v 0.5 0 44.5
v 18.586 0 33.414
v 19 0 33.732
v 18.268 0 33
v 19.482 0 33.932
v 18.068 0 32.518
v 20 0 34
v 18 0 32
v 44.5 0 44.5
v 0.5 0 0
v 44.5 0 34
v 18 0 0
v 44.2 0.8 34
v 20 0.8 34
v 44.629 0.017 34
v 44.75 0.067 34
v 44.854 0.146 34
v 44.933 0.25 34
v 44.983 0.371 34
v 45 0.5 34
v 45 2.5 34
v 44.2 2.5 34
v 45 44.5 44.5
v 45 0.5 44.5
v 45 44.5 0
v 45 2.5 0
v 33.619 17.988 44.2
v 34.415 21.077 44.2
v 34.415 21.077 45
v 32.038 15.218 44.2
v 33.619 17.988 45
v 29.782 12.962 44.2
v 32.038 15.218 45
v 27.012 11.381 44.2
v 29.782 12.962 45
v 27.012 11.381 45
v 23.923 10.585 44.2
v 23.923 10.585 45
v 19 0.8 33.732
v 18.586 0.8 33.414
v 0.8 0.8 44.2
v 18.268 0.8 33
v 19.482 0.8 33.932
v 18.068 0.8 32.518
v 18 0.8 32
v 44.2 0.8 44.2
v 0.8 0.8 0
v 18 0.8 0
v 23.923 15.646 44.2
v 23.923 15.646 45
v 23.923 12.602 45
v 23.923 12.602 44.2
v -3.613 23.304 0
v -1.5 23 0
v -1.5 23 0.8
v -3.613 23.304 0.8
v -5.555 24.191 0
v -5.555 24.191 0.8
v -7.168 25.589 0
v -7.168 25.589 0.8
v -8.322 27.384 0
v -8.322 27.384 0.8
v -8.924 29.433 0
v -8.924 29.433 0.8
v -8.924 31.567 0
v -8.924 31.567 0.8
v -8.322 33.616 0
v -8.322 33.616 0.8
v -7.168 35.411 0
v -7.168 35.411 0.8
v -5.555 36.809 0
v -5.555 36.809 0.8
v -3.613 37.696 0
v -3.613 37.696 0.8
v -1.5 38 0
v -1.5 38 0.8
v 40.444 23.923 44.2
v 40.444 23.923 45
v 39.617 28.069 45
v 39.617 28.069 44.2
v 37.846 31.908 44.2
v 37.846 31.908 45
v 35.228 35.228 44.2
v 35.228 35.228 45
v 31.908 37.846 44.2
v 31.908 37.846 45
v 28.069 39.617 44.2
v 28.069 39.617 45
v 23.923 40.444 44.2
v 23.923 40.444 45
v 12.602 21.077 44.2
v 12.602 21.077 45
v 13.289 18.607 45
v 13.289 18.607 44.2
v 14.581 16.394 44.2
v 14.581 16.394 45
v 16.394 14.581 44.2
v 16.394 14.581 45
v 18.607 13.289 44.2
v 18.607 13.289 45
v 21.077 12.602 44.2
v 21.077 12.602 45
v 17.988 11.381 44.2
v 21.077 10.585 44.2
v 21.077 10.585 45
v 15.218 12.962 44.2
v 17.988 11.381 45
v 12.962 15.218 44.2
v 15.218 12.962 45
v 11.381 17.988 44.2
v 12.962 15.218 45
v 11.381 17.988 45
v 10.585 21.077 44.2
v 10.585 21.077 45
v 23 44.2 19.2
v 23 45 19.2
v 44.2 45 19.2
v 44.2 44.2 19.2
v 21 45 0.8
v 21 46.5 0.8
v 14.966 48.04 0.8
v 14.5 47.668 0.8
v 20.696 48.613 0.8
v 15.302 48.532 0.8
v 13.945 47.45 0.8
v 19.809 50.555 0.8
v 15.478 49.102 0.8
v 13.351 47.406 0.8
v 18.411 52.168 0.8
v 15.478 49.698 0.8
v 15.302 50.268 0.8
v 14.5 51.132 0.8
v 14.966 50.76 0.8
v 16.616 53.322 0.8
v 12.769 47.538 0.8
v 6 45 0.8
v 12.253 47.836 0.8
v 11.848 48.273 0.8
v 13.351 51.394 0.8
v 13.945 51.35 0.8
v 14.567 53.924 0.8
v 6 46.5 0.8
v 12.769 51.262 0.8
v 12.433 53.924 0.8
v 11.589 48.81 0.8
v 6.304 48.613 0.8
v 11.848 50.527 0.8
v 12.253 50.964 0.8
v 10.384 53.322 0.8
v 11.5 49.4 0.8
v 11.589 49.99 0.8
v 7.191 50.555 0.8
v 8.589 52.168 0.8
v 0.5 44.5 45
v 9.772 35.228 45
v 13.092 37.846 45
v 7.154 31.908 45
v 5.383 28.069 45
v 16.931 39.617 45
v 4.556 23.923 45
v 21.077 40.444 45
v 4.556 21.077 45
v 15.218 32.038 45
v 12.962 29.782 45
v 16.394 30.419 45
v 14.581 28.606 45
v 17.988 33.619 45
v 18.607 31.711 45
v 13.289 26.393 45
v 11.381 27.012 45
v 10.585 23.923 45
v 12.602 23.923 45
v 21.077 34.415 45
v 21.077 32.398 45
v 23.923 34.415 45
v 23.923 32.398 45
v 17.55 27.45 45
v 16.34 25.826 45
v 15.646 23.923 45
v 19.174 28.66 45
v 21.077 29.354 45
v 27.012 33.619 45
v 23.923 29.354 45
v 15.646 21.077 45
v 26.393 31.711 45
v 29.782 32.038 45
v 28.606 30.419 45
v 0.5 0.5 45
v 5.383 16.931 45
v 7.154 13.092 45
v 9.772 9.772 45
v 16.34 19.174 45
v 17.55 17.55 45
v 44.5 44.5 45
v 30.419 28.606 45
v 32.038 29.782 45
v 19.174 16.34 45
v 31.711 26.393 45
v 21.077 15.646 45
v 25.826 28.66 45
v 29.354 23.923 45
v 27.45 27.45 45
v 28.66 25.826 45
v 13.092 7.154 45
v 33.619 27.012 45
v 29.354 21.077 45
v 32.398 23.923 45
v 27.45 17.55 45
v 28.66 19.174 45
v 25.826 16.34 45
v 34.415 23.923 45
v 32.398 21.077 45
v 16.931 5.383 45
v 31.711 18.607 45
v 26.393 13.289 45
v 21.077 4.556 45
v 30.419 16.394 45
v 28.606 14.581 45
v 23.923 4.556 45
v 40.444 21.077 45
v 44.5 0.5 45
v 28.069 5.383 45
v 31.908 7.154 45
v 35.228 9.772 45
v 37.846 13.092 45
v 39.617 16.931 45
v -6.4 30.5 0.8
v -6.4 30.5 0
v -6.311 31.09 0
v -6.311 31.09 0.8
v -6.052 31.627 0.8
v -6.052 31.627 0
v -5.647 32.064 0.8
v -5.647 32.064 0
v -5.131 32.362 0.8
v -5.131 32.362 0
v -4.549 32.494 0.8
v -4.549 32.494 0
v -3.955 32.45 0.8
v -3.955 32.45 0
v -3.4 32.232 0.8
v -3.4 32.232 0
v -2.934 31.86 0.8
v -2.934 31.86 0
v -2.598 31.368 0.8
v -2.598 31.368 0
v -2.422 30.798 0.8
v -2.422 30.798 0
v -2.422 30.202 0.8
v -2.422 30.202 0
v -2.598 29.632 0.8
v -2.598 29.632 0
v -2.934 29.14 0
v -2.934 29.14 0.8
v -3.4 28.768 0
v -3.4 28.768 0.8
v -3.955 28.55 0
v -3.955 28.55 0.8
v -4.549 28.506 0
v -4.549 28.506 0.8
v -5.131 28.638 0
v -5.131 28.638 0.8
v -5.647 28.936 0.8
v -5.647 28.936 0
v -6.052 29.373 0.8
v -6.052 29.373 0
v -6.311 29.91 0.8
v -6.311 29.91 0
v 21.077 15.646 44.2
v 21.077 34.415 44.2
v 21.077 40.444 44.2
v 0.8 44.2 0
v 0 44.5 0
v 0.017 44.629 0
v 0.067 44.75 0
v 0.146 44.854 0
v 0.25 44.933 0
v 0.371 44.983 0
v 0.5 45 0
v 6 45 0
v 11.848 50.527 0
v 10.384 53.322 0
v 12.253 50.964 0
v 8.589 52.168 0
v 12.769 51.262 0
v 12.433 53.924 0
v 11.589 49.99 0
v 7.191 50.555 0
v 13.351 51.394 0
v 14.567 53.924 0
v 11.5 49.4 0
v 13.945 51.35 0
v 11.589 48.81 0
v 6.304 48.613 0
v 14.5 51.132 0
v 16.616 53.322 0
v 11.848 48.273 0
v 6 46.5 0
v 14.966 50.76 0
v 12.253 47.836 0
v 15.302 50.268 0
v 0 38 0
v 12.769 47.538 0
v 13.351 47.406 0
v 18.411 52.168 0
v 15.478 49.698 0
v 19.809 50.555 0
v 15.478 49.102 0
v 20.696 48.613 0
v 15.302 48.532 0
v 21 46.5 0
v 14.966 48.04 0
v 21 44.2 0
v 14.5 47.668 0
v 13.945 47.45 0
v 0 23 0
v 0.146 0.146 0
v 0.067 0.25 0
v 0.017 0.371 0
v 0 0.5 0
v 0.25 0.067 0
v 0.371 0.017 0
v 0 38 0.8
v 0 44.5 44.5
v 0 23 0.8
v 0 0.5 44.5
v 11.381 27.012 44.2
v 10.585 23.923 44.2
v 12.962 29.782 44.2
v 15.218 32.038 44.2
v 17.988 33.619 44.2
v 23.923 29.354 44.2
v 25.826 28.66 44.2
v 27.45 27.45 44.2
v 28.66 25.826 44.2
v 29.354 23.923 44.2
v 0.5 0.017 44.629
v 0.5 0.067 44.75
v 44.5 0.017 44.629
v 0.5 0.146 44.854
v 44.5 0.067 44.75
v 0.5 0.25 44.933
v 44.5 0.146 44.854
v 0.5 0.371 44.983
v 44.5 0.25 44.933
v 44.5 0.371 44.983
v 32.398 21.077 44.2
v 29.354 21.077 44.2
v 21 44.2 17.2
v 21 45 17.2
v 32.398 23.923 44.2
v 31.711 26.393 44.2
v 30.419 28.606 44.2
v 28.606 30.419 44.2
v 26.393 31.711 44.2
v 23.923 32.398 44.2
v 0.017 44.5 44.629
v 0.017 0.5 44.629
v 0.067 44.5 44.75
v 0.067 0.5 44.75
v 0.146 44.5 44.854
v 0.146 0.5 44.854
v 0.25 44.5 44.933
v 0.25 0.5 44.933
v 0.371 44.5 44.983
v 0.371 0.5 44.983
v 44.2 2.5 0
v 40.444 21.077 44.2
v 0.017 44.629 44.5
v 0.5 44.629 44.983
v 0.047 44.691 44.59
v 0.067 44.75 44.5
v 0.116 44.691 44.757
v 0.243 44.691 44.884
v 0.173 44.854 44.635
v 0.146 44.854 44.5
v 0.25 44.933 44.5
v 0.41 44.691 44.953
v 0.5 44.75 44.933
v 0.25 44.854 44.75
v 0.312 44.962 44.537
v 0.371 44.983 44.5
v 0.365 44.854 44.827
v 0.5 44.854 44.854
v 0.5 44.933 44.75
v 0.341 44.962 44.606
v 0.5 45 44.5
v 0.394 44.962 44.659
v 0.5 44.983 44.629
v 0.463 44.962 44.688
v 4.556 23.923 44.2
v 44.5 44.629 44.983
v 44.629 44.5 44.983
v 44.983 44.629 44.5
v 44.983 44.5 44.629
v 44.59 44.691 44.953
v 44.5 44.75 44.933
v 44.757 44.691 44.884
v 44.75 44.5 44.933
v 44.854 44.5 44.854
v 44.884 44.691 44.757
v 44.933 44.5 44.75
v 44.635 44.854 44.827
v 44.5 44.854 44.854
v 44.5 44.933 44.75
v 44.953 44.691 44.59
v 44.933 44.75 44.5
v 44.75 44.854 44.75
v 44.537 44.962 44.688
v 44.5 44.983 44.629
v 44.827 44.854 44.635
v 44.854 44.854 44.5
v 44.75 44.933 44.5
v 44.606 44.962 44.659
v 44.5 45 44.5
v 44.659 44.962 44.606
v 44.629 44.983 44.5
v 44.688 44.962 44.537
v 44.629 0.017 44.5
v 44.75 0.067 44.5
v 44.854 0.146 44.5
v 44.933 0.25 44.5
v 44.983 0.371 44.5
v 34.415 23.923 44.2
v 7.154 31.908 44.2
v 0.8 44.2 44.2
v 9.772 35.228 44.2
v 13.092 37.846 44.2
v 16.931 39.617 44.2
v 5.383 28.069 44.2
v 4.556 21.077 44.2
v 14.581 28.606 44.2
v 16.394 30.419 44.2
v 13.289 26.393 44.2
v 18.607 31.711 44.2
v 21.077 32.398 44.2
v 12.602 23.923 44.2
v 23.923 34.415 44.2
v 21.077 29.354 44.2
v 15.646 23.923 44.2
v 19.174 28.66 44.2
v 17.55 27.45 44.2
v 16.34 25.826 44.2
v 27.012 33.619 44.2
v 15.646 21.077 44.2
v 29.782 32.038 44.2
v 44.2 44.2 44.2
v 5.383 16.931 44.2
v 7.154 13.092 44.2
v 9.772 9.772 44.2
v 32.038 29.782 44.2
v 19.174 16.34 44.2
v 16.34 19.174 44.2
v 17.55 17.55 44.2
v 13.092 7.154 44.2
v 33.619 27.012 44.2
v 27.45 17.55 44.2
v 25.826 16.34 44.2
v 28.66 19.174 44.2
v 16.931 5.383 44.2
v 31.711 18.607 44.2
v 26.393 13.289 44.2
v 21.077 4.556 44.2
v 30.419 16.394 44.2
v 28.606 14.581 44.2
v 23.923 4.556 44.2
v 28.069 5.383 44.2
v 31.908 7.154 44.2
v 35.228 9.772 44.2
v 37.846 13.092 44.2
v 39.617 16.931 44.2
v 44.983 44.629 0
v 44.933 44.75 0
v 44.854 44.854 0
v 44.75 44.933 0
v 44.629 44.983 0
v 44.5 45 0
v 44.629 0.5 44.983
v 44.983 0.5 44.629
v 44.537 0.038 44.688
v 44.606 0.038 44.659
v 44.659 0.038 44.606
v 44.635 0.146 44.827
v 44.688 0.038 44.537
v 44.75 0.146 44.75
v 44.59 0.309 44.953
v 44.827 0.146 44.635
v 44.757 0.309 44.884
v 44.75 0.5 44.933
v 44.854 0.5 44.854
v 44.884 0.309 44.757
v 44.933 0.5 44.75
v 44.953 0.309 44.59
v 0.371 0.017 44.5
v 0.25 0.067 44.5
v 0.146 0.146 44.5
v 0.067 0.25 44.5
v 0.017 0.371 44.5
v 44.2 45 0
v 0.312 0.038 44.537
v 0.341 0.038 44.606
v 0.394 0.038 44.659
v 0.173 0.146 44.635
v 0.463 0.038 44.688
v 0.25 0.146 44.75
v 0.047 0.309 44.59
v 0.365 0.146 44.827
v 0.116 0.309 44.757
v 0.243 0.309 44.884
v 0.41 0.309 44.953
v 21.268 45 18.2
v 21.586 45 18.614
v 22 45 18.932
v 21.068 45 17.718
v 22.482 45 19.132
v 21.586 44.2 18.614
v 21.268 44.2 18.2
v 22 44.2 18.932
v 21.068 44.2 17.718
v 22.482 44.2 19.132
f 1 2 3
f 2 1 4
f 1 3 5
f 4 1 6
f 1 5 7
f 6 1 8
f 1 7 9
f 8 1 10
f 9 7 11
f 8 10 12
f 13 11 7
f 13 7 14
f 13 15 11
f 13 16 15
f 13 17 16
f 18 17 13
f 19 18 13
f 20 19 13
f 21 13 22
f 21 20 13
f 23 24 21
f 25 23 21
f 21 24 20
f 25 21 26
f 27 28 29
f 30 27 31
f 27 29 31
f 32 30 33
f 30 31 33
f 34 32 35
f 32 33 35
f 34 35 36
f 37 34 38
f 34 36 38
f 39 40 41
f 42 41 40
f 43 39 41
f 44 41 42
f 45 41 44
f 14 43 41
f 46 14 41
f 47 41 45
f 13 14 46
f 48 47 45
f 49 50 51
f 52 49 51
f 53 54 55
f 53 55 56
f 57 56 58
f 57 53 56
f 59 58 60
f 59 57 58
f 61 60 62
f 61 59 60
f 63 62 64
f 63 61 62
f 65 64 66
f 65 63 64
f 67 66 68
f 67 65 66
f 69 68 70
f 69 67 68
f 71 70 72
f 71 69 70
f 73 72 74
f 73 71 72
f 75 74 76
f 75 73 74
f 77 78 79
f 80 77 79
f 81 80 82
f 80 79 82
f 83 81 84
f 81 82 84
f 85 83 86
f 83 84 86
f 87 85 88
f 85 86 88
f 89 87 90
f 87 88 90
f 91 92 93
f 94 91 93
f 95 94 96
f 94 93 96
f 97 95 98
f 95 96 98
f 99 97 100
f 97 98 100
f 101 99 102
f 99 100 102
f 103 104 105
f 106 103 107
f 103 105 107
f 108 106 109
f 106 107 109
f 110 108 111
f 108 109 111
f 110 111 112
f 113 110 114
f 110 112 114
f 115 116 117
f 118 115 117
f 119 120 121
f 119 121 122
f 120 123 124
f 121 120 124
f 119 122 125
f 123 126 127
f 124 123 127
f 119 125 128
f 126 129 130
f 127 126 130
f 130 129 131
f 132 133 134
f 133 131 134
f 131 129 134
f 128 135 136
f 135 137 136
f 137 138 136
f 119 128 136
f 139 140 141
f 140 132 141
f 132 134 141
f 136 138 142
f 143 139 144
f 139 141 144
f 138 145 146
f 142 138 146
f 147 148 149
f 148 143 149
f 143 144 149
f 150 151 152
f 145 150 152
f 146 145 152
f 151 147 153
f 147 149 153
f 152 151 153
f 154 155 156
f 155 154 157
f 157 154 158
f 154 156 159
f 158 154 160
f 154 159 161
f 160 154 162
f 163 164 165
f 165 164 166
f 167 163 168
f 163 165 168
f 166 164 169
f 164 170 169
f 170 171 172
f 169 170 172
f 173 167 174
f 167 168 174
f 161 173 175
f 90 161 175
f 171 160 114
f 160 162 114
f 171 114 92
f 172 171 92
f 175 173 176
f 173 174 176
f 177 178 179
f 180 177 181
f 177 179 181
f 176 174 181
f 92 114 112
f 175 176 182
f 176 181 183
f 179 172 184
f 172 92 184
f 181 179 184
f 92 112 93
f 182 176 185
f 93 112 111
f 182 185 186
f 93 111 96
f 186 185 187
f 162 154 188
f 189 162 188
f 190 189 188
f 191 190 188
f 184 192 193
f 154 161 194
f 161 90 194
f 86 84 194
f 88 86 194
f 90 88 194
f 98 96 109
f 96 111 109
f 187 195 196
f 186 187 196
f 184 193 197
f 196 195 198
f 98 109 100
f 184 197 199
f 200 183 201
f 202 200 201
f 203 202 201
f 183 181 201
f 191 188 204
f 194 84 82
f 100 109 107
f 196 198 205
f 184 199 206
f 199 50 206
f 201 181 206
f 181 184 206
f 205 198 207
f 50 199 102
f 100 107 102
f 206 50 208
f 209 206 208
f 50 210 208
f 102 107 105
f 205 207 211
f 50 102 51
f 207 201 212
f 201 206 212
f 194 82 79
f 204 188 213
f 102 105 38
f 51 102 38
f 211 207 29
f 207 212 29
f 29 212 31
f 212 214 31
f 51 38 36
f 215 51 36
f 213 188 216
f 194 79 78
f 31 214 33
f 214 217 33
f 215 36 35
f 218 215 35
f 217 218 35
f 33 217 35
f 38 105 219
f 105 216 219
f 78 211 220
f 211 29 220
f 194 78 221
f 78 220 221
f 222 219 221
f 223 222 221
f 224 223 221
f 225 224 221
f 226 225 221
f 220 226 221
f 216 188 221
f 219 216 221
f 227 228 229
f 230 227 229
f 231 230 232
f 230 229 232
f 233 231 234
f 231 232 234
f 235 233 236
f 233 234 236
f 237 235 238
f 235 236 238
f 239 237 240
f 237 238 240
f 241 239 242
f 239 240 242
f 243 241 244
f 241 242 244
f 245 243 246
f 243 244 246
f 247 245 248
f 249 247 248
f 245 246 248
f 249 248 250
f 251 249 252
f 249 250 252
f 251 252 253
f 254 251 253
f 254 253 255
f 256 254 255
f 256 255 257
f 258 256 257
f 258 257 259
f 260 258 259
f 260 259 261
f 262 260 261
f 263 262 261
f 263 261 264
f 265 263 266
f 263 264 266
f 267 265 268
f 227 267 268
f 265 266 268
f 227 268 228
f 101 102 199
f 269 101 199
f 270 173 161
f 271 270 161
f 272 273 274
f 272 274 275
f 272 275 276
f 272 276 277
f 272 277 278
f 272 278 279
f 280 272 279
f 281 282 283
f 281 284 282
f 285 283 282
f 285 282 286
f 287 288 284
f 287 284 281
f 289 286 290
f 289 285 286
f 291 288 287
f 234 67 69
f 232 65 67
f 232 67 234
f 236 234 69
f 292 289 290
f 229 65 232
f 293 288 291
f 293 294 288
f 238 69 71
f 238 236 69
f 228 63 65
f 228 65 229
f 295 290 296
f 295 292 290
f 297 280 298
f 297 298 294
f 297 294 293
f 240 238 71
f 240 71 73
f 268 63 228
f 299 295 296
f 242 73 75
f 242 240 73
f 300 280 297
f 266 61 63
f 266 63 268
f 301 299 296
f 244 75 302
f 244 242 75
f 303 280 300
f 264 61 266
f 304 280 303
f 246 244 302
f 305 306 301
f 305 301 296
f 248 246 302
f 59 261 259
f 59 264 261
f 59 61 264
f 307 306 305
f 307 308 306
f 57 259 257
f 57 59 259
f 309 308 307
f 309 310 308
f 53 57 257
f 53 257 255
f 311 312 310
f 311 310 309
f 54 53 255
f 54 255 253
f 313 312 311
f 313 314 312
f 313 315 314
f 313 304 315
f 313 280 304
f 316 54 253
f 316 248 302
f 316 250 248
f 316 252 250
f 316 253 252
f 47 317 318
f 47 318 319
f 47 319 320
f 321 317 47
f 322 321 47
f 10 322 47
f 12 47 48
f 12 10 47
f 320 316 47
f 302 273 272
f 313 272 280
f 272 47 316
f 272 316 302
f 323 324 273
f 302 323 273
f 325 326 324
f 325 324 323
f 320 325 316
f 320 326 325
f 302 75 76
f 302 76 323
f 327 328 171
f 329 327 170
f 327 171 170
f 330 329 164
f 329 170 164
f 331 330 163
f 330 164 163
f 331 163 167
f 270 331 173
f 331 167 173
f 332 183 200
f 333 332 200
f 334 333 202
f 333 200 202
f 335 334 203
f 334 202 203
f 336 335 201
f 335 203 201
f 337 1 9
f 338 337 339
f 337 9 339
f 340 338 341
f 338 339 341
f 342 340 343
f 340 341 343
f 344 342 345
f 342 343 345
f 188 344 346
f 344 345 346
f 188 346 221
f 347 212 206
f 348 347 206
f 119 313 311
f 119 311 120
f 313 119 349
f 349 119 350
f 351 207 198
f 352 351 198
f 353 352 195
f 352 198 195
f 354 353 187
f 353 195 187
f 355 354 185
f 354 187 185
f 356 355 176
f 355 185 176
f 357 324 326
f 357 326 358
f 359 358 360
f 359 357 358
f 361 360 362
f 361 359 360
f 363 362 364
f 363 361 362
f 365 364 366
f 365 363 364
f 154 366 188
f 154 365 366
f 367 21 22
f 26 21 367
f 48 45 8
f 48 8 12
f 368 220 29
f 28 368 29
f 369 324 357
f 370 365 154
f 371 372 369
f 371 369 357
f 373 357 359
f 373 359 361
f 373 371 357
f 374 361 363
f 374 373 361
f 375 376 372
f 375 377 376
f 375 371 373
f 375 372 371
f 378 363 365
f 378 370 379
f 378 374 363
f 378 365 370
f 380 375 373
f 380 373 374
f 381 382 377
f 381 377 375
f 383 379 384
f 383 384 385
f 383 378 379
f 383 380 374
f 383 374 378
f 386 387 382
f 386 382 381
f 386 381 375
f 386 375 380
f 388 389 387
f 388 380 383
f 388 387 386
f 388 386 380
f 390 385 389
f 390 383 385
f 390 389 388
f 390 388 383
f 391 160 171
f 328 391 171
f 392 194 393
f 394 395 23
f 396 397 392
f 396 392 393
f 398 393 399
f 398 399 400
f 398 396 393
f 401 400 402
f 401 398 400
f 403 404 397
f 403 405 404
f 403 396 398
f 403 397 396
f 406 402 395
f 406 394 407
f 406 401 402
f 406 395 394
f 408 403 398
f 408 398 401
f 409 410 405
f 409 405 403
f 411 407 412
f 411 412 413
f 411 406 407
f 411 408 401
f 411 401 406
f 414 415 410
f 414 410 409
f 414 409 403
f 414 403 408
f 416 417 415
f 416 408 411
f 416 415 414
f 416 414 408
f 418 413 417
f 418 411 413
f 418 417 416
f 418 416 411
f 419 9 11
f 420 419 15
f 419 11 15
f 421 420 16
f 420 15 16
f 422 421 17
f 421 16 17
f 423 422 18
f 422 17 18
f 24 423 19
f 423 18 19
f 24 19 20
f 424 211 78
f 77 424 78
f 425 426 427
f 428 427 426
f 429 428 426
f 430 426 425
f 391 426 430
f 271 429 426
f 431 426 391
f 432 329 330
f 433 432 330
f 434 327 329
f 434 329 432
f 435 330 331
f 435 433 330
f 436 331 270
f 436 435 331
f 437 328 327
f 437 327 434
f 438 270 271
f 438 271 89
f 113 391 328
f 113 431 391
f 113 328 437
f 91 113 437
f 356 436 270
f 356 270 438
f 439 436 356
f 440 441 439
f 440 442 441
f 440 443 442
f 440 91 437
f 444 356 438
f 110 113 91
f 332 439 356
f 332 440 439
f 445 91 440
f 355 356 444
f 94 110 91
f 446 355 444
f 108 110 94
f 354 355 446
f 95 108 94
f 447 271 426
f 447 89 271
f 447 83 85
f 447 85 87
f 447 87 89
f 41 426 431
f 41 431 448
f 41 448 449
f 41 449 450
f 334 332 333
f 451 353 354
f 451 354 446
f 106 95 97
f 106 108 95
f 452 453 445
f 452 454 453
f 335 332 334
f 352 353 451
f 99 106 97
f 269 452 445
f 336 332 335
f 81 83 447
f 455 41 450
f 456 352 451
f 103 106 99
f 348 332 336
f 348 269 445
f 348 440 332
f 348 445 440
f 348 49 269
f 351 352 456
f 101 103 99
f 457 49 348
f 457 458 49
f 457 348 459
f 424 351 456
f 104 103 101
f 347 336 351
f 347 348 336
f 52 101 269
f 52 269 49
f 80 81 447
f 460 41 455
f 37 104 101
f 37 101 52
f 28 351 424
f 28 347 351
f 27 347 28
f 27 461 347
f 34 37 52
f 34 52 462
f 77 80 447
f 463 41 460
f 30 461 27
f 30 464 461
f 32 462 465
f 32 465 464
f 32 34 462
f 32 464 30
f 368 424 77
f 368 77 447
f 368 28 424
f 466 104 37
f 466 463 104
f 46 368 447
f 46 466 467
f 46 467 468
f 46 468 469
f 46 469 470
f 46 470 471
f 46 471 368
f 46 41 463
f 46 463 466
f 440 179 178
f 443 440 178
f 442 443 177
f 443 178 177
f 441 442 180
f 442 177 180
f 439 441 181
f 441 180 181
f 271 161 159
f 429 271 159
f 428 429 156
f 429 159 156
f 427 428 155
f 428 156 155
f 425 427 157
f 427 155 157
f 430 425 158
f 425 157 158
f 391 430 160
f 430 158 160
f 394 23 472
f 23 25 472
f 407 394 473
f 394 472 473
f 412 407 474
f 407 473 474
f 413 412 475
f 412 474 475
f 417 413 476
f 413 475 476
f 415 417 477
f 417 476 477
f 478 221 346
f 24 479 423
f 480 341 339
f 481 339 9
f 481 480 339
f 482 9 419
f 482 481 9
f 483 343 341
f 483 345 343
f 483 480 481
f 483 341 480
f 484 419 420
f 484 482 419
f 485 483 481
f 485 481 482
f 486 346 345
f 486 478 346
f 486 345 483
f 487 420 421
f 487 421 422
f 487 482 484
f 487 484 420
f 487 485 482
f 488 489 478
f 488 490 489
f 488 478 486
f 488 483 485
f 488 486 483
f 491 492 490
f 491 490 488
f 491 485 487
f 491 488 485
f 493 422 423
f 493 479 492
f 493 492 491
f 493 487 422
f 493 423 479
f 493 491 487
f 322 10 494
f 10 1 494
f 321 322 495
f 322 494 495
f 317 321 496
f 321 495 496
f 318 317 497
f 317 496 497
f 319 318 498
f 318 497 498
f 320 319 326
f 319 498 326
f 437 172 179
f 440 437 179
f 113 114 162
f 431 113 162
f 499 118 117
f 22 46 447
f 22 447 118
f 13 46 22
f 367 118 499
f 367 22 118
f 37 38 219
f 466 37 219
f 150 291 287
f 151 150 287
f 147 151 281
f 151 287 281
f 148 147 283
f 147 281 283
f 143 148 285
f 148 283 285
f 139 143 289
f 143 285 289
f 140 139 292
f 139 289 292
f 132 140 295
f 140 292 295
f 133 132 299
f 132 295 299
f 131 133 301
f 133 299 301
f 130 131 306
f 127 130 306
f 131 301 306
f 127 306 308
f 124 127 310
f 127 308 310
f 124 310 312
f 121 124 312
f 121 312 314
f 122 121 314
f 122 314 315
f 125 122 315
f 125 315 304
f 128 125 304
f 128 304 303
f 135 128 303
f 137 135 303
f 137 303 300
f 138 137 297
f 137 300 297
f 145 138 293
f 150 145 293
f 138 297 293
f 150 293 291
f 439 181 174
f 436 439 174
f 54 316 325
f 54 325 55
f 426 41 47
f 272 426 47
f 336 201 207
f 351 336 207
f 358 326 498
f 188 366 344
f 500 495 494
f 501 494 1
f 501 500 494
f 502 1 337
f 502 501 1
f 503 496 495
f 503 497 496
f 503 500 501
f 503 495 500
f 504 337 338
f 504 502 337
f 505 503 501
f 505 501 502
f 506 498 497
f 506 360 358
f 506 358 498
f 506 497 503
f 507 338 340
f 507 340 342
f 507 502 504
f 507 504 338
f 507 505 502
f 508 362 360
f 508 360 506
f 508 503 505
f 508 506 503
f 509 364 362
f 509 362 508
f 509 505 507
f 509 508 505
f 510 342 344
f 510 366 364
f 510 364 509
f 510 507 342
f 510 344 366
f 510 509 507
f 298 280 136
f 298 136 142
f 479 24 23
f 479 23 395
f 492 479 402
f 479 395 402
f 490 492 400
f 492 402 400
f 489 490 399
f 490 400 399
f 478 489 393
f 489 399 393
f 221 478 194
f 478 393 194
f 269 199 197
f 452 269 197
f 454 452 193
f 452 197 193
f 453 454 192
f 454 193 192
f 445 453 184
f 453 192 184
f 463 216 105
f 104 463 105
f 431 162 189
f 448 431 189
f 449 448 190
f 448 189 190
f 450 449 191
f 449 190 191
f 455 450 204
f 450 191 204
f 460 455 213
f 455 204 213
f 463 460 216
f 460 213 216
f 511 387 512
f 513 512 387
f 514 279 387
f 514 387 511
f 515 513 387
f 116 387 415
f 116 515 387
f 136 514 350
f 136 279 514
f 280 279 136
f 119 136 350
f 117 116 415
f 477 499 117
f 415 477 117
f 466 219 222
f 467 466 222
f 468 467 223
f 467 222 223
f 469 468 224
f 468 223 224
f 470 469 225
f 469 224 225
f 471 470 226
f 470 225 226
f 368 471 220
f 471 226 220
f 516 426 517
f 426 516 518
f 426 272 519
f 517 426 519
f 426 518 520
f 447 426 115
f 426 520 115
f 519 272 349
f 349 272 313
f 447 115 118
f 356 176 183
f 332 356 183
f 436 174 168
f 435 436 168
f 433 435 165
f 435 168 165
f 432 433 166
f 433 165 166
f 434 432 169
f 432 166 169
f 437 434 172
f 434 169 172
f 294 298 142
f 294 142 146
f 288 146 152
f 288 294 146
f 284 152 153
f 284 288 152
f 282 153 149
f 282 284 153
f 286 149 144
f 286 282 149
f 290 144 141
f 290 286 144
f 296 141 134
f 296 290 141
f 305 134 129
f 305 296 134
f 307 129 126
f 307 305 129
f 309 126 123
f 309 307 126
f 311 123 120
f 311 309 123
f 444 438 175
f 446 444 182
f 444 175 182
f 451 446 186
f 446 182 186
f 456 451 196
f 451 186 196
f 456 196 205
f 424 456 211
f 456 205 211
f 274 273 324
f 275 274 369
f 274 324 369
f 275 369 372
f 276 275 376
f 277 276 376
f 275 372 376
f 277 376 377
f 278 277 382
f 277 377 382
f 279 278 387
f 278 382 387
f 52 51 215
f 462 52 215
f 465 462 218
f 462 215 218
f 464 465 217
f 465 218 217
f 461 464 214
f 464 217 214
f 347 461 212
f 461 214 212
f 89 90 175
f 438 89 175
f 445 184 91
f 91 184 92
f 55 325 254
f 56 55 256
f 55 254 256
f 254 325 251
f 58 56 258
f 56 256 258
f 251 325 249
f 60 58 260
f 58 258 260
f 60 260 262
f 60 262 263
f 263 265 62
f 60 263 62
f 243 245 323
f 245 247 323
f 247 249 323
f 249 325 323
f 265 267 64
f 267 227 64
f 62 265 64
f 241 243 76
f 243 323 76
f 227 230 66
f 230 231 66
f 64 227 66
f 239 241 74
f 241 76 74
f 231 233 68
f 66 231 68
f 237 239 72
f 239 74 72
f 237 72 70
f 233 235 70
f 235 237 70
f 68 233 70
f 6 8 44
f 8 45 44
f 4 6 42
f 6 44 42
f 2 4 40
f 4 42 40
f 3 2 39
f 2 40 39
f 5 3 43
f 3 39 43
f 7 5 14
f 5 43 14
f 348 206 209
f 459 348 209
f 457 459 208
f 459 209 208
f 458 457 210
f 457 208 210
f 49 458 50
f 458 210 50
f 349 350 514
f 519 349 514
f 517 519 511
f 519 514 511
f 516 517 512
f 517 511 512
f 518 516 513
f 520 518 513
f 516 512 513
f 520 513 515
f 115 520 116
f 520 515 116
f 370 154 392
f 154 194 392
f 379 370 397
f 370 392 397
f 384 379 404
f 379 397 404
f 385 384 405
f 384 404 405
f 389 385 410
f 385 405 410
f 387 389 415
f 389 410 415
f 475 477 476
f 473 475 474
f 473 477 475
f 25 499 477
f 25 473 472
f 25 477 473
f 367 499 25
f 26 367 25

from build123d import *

# Parameters (mm, degrees)
SKETCH1_W           = 45
SKETCH1_H           = 45
BOSS_EXTRUDE1_DEPTH = 45
SHELL1_T            = -0.8
CUT_EXTRUDE1_DEPTH  = 45
SKETCH3_W           = 34
SKETCH3_H           = 2.5
CUT_EXTRUDE2_DEPTH  = 27
FILLET1_R           = 2
FILLET2_R           = 0.5
FILLET3_R           = 0.5
SKETCH4_R           = 2
BOSS_EXTRUDE2_DEPTH = 0.8
CUT_EXTRUDE4_DEPTH  = 0.8


with BuildPart() as part:
    # Sketch1 → Boss-Extrude1 (new body)
    with BuildSketch(Plane(origin=(0, 0, 0), x_dir=(1, 0, 0), z_dir=(0, 1, 0))):
        with Locations((22.5, -22.5)):
            Rectangle(SKETCH1_W, SKETCH1_H)
    extrude(amount=BOSS_EXTRUDE1_DEPTH)

    # Shell1
    shell1_openings = [part.faces().sort_by_distance(p)[0] for p in [
        (22.5, 22.5, 0),
    ]]
    offset(amount=SHELL1_T, openings=shell1_openings, kind=Kind.INTERSECTION)

    # Sketch2 → Cut-Extrude1 (cut)
    with BuildSketch(Plane.XY.offset(45)):
        with BuildLine():
            Line((21.076744556, 34.415298735), (21.076744556, 40.443643553))
            ThreePointArc((21.076744556, 40.443643553), (9.772077939, 35.227922061), (4.556356447, 23.923255444))
            Line((4.556356447, 23.923255444), (10.584701265, 23.923255444))
            ThreePointArc((10.584701265, 23.923255444), (14.014718626, 30.985281374), (21.076744556, 34.415298735))
        make_face()
        with BuildLine():
            ThreePointArc((40.443643553, 23.923255444), (35.227922061, 35.227922061), (23.923255444, 40.443643553))
            Line((23.923255444, 40.443643553), (23.923255444, 34.415298735))
            ThreePointArc((23.923255444, 34.415298735), (30.985281374, 30.985281374), (34.415298735, 23.923255444))
            Line((34.415298735, 23.923255444), (40.443643553, 23.923255444))
        make_face()
        with BuildLine():
            ThreePointArc((23.923255444, 4.556356447), (35.227922061, 9.772077939), (40.443643553, 21.076744556))
            Line((40.443643553, 21.076744556), (34.415298735, 21.076744556))
            ThreePointArc((34.415298735, 21.076744556), (30.985281374, 14.014718626), (23.923255444, 10.584701265))
            Line((23.923255444, 10.584701265), (23.923255444, 4.556356447))
        make_face()
        with BuildLine():
            Line((10.584701265, 21.076744556), (4.556356447, 21.076744556))
            ThreePointArc((4.556356447, 21.076744556), (9.772077939, 9.772077939), (21.076744556, 4.556356447))
            Line((21.076744556, 4.556356447), (21.076744556, 10.584701265))
            ThreePointArc((21.076744556, 10.584701265), (14.014718626, 14.014718626), (10.584701265, 21.076744556))
        make_face()
        with BuildLine():
            ThreePointArc((23.923255444, 12.601800975), (29.571067812, 15.428932188), (32.398199025, 21.076744556))
            Line((32.398199025, 21.076744556), (29.353783184, 21.076744556))
            ThreePointArc((29.353783184, 21.076744556), (27.449747468, 17.550252532), (23.923255444, 15.646216816))
            Line((23.923255444, 15.646216816), (23.923255444, 12.601800975))
        make_face()
        with BuildLine():
            ThreePointArc((32.398199025, 23.923255444), (29.571067812, 29.571067812), (23.923255444, 32.398199025))
            Line((23.923255444, 32.398199025), (23.923255444, 29.353783184))
            ThreePointArc((23.923255444, 29.353783184), (27.449747468, 27.449747468), (29.353783184, 23.923255444))
            Line((29.353783184, 23.923255444), (32.398199025, 23.923255444))
        make_face()
        with BuildLine():
            Line((21.076744556, 29.353783184), (21.076744556, 32.398199025))
            ThreePointArc((21.076744556, 32.398199025), (15.428932188, 29.571067812), (12.601800975, 23.923255444))
            Line((12.601800975, 23.923255444), (15.646216816, 23.923255444))
            ThreePointArc((15.646216816, 23.923255444), (17.550252532, 27.449747468), (21.076744556, 29.353783184))
        make_face()
        with BuildLine():
            Line((15.646216816, 21.076744556), (12.601800975, 21.076744556))
            ThreePointArc((12.601800975, 21.076744556), (15.428932188, 15.428932188), (21.076744556, 12.601800975))
            Line((21.076744556, 12.601800975), (21.076744556, 15.646216816))
            ThreePointArc((21.076744556, 15.646216816), (17.550252532, 17.550252532), (15.646216816, 21.076744556))
        make_face()
    extrude(amount=-CUT_EXTRUDE1_DEPTH, mode=Mode.SUBTRACT)

    # Sketch3 → Cut-Extrude2 (cut)
    with BuildSketch(Plane(origin=(45, 0, 0), x_dir=(0, 0, -1), z_dir=(1, 0, 0))):
        with Locations((-17, 1.25)):
            Rectangle(SKETCH3_W, SKETCH3_H)
    extrude(amount=-CUT_EXTRUDE2_DEPTH, mode=Mode.SUBTRACT)

    # Fillet1
    fillet1_edges = [part.edges().sort_by_distance(p)[0] for p in [
        (18, 0.4, 34),
    ]]
    fillet(fillet1_edges, radius=FILLET1_R)

    # Fillet2
    fillet2_edges = [part.edges().sort_by_distance(p)[0] for p in [
        (45, 22.5, 45),
        (0, 22.5, 45),
    ]]
    fillet(fillet2_edges, radius=FILLET2_R)

    # Fillet3
    fillet3_edges = [part.edges().sort_by_distance(p)[0] for p in [
        (22.5, 0, 45),
        (22.5, 45, 45),
        (45, 0, 39.25),
        (44.853553391, 0, 44.853553391),
        (0.146446609, 0, 44.853553391),
        (45, 45, 22.25),
        (44.853553391, 45, 44.853553391),
        (0.146446609, 45, 44.853553391),
        (0, 45, 22.25),
        (0, 0, 22.25),
    ]]
    fillet(fillet3_edges, radius=FILLET3_R)

    # Sketch4 → Boss-Extrude2 (add)
    # profile 1 of 2: a face of its own
    with BuildSketch(Plane(origin=(0, 0, 0), x_dir=(-1, 0, 0), z_dir=(0, 0, -1))):
        with BuildLine():
            Line((-21, 45), (-6, 45))
            Line((-6, 45), (-6, 46.5))
            ThreePointArc((-6, 46.5), (-13.5, 54), (-21, 46.5))
            Line((-21, 46.5), (-21, 45))
        make_face()
        with Locations((-13.5, 49.4)):
            Circle(SKETCH4_R, mode=Mode.SUBTRACT)
    # profile 2 of 2: a face of its own
    with BuildSketch(Plane(origin=(0, 0, 0), x_dir=(-1, 0, 0), z_dir=(0, 0, -1))):
        with BuildLine():
            Line((1.5, 38), (0, 38))
            Line((0, 38), (0, 23))
            Line((0, 23), (1.5, 23))
            ThreePointArc((1.5, 23), (9, 30.5), (1.5, 38))
        make_face()
        with Locations((4.4, 30.5)):
            Circle(SKETCH4_R, mode=Mode.SUBTRACT)
    extrude(amount=-BOSS_EXTRUDE2_DEPTH)

    # Sketch5 → Cut-Extrude4 (cut)
    with BuildSketch(Plane(origin=(0, 45, 0), x_dir=(1, 0, 0), z_dir=(0, 1, 0))):
        with BuildLine():
            Line((21, 0), (21, -17.2))
            ThreePointArc((21, -17.2), (21.585786438, -18.614213562), (23, -19.2))
            Line((23, -19.2), (44.2, -19.2))
            Line((44.2, -19.2), (44.2, 0))
            Line((44.2, 0), (21, 0))
        make_face()
    extrude(amount=-CUT_EXTRUDE4_DEPTH, mode=Mode.SUBTRACT)


solid = part.part
